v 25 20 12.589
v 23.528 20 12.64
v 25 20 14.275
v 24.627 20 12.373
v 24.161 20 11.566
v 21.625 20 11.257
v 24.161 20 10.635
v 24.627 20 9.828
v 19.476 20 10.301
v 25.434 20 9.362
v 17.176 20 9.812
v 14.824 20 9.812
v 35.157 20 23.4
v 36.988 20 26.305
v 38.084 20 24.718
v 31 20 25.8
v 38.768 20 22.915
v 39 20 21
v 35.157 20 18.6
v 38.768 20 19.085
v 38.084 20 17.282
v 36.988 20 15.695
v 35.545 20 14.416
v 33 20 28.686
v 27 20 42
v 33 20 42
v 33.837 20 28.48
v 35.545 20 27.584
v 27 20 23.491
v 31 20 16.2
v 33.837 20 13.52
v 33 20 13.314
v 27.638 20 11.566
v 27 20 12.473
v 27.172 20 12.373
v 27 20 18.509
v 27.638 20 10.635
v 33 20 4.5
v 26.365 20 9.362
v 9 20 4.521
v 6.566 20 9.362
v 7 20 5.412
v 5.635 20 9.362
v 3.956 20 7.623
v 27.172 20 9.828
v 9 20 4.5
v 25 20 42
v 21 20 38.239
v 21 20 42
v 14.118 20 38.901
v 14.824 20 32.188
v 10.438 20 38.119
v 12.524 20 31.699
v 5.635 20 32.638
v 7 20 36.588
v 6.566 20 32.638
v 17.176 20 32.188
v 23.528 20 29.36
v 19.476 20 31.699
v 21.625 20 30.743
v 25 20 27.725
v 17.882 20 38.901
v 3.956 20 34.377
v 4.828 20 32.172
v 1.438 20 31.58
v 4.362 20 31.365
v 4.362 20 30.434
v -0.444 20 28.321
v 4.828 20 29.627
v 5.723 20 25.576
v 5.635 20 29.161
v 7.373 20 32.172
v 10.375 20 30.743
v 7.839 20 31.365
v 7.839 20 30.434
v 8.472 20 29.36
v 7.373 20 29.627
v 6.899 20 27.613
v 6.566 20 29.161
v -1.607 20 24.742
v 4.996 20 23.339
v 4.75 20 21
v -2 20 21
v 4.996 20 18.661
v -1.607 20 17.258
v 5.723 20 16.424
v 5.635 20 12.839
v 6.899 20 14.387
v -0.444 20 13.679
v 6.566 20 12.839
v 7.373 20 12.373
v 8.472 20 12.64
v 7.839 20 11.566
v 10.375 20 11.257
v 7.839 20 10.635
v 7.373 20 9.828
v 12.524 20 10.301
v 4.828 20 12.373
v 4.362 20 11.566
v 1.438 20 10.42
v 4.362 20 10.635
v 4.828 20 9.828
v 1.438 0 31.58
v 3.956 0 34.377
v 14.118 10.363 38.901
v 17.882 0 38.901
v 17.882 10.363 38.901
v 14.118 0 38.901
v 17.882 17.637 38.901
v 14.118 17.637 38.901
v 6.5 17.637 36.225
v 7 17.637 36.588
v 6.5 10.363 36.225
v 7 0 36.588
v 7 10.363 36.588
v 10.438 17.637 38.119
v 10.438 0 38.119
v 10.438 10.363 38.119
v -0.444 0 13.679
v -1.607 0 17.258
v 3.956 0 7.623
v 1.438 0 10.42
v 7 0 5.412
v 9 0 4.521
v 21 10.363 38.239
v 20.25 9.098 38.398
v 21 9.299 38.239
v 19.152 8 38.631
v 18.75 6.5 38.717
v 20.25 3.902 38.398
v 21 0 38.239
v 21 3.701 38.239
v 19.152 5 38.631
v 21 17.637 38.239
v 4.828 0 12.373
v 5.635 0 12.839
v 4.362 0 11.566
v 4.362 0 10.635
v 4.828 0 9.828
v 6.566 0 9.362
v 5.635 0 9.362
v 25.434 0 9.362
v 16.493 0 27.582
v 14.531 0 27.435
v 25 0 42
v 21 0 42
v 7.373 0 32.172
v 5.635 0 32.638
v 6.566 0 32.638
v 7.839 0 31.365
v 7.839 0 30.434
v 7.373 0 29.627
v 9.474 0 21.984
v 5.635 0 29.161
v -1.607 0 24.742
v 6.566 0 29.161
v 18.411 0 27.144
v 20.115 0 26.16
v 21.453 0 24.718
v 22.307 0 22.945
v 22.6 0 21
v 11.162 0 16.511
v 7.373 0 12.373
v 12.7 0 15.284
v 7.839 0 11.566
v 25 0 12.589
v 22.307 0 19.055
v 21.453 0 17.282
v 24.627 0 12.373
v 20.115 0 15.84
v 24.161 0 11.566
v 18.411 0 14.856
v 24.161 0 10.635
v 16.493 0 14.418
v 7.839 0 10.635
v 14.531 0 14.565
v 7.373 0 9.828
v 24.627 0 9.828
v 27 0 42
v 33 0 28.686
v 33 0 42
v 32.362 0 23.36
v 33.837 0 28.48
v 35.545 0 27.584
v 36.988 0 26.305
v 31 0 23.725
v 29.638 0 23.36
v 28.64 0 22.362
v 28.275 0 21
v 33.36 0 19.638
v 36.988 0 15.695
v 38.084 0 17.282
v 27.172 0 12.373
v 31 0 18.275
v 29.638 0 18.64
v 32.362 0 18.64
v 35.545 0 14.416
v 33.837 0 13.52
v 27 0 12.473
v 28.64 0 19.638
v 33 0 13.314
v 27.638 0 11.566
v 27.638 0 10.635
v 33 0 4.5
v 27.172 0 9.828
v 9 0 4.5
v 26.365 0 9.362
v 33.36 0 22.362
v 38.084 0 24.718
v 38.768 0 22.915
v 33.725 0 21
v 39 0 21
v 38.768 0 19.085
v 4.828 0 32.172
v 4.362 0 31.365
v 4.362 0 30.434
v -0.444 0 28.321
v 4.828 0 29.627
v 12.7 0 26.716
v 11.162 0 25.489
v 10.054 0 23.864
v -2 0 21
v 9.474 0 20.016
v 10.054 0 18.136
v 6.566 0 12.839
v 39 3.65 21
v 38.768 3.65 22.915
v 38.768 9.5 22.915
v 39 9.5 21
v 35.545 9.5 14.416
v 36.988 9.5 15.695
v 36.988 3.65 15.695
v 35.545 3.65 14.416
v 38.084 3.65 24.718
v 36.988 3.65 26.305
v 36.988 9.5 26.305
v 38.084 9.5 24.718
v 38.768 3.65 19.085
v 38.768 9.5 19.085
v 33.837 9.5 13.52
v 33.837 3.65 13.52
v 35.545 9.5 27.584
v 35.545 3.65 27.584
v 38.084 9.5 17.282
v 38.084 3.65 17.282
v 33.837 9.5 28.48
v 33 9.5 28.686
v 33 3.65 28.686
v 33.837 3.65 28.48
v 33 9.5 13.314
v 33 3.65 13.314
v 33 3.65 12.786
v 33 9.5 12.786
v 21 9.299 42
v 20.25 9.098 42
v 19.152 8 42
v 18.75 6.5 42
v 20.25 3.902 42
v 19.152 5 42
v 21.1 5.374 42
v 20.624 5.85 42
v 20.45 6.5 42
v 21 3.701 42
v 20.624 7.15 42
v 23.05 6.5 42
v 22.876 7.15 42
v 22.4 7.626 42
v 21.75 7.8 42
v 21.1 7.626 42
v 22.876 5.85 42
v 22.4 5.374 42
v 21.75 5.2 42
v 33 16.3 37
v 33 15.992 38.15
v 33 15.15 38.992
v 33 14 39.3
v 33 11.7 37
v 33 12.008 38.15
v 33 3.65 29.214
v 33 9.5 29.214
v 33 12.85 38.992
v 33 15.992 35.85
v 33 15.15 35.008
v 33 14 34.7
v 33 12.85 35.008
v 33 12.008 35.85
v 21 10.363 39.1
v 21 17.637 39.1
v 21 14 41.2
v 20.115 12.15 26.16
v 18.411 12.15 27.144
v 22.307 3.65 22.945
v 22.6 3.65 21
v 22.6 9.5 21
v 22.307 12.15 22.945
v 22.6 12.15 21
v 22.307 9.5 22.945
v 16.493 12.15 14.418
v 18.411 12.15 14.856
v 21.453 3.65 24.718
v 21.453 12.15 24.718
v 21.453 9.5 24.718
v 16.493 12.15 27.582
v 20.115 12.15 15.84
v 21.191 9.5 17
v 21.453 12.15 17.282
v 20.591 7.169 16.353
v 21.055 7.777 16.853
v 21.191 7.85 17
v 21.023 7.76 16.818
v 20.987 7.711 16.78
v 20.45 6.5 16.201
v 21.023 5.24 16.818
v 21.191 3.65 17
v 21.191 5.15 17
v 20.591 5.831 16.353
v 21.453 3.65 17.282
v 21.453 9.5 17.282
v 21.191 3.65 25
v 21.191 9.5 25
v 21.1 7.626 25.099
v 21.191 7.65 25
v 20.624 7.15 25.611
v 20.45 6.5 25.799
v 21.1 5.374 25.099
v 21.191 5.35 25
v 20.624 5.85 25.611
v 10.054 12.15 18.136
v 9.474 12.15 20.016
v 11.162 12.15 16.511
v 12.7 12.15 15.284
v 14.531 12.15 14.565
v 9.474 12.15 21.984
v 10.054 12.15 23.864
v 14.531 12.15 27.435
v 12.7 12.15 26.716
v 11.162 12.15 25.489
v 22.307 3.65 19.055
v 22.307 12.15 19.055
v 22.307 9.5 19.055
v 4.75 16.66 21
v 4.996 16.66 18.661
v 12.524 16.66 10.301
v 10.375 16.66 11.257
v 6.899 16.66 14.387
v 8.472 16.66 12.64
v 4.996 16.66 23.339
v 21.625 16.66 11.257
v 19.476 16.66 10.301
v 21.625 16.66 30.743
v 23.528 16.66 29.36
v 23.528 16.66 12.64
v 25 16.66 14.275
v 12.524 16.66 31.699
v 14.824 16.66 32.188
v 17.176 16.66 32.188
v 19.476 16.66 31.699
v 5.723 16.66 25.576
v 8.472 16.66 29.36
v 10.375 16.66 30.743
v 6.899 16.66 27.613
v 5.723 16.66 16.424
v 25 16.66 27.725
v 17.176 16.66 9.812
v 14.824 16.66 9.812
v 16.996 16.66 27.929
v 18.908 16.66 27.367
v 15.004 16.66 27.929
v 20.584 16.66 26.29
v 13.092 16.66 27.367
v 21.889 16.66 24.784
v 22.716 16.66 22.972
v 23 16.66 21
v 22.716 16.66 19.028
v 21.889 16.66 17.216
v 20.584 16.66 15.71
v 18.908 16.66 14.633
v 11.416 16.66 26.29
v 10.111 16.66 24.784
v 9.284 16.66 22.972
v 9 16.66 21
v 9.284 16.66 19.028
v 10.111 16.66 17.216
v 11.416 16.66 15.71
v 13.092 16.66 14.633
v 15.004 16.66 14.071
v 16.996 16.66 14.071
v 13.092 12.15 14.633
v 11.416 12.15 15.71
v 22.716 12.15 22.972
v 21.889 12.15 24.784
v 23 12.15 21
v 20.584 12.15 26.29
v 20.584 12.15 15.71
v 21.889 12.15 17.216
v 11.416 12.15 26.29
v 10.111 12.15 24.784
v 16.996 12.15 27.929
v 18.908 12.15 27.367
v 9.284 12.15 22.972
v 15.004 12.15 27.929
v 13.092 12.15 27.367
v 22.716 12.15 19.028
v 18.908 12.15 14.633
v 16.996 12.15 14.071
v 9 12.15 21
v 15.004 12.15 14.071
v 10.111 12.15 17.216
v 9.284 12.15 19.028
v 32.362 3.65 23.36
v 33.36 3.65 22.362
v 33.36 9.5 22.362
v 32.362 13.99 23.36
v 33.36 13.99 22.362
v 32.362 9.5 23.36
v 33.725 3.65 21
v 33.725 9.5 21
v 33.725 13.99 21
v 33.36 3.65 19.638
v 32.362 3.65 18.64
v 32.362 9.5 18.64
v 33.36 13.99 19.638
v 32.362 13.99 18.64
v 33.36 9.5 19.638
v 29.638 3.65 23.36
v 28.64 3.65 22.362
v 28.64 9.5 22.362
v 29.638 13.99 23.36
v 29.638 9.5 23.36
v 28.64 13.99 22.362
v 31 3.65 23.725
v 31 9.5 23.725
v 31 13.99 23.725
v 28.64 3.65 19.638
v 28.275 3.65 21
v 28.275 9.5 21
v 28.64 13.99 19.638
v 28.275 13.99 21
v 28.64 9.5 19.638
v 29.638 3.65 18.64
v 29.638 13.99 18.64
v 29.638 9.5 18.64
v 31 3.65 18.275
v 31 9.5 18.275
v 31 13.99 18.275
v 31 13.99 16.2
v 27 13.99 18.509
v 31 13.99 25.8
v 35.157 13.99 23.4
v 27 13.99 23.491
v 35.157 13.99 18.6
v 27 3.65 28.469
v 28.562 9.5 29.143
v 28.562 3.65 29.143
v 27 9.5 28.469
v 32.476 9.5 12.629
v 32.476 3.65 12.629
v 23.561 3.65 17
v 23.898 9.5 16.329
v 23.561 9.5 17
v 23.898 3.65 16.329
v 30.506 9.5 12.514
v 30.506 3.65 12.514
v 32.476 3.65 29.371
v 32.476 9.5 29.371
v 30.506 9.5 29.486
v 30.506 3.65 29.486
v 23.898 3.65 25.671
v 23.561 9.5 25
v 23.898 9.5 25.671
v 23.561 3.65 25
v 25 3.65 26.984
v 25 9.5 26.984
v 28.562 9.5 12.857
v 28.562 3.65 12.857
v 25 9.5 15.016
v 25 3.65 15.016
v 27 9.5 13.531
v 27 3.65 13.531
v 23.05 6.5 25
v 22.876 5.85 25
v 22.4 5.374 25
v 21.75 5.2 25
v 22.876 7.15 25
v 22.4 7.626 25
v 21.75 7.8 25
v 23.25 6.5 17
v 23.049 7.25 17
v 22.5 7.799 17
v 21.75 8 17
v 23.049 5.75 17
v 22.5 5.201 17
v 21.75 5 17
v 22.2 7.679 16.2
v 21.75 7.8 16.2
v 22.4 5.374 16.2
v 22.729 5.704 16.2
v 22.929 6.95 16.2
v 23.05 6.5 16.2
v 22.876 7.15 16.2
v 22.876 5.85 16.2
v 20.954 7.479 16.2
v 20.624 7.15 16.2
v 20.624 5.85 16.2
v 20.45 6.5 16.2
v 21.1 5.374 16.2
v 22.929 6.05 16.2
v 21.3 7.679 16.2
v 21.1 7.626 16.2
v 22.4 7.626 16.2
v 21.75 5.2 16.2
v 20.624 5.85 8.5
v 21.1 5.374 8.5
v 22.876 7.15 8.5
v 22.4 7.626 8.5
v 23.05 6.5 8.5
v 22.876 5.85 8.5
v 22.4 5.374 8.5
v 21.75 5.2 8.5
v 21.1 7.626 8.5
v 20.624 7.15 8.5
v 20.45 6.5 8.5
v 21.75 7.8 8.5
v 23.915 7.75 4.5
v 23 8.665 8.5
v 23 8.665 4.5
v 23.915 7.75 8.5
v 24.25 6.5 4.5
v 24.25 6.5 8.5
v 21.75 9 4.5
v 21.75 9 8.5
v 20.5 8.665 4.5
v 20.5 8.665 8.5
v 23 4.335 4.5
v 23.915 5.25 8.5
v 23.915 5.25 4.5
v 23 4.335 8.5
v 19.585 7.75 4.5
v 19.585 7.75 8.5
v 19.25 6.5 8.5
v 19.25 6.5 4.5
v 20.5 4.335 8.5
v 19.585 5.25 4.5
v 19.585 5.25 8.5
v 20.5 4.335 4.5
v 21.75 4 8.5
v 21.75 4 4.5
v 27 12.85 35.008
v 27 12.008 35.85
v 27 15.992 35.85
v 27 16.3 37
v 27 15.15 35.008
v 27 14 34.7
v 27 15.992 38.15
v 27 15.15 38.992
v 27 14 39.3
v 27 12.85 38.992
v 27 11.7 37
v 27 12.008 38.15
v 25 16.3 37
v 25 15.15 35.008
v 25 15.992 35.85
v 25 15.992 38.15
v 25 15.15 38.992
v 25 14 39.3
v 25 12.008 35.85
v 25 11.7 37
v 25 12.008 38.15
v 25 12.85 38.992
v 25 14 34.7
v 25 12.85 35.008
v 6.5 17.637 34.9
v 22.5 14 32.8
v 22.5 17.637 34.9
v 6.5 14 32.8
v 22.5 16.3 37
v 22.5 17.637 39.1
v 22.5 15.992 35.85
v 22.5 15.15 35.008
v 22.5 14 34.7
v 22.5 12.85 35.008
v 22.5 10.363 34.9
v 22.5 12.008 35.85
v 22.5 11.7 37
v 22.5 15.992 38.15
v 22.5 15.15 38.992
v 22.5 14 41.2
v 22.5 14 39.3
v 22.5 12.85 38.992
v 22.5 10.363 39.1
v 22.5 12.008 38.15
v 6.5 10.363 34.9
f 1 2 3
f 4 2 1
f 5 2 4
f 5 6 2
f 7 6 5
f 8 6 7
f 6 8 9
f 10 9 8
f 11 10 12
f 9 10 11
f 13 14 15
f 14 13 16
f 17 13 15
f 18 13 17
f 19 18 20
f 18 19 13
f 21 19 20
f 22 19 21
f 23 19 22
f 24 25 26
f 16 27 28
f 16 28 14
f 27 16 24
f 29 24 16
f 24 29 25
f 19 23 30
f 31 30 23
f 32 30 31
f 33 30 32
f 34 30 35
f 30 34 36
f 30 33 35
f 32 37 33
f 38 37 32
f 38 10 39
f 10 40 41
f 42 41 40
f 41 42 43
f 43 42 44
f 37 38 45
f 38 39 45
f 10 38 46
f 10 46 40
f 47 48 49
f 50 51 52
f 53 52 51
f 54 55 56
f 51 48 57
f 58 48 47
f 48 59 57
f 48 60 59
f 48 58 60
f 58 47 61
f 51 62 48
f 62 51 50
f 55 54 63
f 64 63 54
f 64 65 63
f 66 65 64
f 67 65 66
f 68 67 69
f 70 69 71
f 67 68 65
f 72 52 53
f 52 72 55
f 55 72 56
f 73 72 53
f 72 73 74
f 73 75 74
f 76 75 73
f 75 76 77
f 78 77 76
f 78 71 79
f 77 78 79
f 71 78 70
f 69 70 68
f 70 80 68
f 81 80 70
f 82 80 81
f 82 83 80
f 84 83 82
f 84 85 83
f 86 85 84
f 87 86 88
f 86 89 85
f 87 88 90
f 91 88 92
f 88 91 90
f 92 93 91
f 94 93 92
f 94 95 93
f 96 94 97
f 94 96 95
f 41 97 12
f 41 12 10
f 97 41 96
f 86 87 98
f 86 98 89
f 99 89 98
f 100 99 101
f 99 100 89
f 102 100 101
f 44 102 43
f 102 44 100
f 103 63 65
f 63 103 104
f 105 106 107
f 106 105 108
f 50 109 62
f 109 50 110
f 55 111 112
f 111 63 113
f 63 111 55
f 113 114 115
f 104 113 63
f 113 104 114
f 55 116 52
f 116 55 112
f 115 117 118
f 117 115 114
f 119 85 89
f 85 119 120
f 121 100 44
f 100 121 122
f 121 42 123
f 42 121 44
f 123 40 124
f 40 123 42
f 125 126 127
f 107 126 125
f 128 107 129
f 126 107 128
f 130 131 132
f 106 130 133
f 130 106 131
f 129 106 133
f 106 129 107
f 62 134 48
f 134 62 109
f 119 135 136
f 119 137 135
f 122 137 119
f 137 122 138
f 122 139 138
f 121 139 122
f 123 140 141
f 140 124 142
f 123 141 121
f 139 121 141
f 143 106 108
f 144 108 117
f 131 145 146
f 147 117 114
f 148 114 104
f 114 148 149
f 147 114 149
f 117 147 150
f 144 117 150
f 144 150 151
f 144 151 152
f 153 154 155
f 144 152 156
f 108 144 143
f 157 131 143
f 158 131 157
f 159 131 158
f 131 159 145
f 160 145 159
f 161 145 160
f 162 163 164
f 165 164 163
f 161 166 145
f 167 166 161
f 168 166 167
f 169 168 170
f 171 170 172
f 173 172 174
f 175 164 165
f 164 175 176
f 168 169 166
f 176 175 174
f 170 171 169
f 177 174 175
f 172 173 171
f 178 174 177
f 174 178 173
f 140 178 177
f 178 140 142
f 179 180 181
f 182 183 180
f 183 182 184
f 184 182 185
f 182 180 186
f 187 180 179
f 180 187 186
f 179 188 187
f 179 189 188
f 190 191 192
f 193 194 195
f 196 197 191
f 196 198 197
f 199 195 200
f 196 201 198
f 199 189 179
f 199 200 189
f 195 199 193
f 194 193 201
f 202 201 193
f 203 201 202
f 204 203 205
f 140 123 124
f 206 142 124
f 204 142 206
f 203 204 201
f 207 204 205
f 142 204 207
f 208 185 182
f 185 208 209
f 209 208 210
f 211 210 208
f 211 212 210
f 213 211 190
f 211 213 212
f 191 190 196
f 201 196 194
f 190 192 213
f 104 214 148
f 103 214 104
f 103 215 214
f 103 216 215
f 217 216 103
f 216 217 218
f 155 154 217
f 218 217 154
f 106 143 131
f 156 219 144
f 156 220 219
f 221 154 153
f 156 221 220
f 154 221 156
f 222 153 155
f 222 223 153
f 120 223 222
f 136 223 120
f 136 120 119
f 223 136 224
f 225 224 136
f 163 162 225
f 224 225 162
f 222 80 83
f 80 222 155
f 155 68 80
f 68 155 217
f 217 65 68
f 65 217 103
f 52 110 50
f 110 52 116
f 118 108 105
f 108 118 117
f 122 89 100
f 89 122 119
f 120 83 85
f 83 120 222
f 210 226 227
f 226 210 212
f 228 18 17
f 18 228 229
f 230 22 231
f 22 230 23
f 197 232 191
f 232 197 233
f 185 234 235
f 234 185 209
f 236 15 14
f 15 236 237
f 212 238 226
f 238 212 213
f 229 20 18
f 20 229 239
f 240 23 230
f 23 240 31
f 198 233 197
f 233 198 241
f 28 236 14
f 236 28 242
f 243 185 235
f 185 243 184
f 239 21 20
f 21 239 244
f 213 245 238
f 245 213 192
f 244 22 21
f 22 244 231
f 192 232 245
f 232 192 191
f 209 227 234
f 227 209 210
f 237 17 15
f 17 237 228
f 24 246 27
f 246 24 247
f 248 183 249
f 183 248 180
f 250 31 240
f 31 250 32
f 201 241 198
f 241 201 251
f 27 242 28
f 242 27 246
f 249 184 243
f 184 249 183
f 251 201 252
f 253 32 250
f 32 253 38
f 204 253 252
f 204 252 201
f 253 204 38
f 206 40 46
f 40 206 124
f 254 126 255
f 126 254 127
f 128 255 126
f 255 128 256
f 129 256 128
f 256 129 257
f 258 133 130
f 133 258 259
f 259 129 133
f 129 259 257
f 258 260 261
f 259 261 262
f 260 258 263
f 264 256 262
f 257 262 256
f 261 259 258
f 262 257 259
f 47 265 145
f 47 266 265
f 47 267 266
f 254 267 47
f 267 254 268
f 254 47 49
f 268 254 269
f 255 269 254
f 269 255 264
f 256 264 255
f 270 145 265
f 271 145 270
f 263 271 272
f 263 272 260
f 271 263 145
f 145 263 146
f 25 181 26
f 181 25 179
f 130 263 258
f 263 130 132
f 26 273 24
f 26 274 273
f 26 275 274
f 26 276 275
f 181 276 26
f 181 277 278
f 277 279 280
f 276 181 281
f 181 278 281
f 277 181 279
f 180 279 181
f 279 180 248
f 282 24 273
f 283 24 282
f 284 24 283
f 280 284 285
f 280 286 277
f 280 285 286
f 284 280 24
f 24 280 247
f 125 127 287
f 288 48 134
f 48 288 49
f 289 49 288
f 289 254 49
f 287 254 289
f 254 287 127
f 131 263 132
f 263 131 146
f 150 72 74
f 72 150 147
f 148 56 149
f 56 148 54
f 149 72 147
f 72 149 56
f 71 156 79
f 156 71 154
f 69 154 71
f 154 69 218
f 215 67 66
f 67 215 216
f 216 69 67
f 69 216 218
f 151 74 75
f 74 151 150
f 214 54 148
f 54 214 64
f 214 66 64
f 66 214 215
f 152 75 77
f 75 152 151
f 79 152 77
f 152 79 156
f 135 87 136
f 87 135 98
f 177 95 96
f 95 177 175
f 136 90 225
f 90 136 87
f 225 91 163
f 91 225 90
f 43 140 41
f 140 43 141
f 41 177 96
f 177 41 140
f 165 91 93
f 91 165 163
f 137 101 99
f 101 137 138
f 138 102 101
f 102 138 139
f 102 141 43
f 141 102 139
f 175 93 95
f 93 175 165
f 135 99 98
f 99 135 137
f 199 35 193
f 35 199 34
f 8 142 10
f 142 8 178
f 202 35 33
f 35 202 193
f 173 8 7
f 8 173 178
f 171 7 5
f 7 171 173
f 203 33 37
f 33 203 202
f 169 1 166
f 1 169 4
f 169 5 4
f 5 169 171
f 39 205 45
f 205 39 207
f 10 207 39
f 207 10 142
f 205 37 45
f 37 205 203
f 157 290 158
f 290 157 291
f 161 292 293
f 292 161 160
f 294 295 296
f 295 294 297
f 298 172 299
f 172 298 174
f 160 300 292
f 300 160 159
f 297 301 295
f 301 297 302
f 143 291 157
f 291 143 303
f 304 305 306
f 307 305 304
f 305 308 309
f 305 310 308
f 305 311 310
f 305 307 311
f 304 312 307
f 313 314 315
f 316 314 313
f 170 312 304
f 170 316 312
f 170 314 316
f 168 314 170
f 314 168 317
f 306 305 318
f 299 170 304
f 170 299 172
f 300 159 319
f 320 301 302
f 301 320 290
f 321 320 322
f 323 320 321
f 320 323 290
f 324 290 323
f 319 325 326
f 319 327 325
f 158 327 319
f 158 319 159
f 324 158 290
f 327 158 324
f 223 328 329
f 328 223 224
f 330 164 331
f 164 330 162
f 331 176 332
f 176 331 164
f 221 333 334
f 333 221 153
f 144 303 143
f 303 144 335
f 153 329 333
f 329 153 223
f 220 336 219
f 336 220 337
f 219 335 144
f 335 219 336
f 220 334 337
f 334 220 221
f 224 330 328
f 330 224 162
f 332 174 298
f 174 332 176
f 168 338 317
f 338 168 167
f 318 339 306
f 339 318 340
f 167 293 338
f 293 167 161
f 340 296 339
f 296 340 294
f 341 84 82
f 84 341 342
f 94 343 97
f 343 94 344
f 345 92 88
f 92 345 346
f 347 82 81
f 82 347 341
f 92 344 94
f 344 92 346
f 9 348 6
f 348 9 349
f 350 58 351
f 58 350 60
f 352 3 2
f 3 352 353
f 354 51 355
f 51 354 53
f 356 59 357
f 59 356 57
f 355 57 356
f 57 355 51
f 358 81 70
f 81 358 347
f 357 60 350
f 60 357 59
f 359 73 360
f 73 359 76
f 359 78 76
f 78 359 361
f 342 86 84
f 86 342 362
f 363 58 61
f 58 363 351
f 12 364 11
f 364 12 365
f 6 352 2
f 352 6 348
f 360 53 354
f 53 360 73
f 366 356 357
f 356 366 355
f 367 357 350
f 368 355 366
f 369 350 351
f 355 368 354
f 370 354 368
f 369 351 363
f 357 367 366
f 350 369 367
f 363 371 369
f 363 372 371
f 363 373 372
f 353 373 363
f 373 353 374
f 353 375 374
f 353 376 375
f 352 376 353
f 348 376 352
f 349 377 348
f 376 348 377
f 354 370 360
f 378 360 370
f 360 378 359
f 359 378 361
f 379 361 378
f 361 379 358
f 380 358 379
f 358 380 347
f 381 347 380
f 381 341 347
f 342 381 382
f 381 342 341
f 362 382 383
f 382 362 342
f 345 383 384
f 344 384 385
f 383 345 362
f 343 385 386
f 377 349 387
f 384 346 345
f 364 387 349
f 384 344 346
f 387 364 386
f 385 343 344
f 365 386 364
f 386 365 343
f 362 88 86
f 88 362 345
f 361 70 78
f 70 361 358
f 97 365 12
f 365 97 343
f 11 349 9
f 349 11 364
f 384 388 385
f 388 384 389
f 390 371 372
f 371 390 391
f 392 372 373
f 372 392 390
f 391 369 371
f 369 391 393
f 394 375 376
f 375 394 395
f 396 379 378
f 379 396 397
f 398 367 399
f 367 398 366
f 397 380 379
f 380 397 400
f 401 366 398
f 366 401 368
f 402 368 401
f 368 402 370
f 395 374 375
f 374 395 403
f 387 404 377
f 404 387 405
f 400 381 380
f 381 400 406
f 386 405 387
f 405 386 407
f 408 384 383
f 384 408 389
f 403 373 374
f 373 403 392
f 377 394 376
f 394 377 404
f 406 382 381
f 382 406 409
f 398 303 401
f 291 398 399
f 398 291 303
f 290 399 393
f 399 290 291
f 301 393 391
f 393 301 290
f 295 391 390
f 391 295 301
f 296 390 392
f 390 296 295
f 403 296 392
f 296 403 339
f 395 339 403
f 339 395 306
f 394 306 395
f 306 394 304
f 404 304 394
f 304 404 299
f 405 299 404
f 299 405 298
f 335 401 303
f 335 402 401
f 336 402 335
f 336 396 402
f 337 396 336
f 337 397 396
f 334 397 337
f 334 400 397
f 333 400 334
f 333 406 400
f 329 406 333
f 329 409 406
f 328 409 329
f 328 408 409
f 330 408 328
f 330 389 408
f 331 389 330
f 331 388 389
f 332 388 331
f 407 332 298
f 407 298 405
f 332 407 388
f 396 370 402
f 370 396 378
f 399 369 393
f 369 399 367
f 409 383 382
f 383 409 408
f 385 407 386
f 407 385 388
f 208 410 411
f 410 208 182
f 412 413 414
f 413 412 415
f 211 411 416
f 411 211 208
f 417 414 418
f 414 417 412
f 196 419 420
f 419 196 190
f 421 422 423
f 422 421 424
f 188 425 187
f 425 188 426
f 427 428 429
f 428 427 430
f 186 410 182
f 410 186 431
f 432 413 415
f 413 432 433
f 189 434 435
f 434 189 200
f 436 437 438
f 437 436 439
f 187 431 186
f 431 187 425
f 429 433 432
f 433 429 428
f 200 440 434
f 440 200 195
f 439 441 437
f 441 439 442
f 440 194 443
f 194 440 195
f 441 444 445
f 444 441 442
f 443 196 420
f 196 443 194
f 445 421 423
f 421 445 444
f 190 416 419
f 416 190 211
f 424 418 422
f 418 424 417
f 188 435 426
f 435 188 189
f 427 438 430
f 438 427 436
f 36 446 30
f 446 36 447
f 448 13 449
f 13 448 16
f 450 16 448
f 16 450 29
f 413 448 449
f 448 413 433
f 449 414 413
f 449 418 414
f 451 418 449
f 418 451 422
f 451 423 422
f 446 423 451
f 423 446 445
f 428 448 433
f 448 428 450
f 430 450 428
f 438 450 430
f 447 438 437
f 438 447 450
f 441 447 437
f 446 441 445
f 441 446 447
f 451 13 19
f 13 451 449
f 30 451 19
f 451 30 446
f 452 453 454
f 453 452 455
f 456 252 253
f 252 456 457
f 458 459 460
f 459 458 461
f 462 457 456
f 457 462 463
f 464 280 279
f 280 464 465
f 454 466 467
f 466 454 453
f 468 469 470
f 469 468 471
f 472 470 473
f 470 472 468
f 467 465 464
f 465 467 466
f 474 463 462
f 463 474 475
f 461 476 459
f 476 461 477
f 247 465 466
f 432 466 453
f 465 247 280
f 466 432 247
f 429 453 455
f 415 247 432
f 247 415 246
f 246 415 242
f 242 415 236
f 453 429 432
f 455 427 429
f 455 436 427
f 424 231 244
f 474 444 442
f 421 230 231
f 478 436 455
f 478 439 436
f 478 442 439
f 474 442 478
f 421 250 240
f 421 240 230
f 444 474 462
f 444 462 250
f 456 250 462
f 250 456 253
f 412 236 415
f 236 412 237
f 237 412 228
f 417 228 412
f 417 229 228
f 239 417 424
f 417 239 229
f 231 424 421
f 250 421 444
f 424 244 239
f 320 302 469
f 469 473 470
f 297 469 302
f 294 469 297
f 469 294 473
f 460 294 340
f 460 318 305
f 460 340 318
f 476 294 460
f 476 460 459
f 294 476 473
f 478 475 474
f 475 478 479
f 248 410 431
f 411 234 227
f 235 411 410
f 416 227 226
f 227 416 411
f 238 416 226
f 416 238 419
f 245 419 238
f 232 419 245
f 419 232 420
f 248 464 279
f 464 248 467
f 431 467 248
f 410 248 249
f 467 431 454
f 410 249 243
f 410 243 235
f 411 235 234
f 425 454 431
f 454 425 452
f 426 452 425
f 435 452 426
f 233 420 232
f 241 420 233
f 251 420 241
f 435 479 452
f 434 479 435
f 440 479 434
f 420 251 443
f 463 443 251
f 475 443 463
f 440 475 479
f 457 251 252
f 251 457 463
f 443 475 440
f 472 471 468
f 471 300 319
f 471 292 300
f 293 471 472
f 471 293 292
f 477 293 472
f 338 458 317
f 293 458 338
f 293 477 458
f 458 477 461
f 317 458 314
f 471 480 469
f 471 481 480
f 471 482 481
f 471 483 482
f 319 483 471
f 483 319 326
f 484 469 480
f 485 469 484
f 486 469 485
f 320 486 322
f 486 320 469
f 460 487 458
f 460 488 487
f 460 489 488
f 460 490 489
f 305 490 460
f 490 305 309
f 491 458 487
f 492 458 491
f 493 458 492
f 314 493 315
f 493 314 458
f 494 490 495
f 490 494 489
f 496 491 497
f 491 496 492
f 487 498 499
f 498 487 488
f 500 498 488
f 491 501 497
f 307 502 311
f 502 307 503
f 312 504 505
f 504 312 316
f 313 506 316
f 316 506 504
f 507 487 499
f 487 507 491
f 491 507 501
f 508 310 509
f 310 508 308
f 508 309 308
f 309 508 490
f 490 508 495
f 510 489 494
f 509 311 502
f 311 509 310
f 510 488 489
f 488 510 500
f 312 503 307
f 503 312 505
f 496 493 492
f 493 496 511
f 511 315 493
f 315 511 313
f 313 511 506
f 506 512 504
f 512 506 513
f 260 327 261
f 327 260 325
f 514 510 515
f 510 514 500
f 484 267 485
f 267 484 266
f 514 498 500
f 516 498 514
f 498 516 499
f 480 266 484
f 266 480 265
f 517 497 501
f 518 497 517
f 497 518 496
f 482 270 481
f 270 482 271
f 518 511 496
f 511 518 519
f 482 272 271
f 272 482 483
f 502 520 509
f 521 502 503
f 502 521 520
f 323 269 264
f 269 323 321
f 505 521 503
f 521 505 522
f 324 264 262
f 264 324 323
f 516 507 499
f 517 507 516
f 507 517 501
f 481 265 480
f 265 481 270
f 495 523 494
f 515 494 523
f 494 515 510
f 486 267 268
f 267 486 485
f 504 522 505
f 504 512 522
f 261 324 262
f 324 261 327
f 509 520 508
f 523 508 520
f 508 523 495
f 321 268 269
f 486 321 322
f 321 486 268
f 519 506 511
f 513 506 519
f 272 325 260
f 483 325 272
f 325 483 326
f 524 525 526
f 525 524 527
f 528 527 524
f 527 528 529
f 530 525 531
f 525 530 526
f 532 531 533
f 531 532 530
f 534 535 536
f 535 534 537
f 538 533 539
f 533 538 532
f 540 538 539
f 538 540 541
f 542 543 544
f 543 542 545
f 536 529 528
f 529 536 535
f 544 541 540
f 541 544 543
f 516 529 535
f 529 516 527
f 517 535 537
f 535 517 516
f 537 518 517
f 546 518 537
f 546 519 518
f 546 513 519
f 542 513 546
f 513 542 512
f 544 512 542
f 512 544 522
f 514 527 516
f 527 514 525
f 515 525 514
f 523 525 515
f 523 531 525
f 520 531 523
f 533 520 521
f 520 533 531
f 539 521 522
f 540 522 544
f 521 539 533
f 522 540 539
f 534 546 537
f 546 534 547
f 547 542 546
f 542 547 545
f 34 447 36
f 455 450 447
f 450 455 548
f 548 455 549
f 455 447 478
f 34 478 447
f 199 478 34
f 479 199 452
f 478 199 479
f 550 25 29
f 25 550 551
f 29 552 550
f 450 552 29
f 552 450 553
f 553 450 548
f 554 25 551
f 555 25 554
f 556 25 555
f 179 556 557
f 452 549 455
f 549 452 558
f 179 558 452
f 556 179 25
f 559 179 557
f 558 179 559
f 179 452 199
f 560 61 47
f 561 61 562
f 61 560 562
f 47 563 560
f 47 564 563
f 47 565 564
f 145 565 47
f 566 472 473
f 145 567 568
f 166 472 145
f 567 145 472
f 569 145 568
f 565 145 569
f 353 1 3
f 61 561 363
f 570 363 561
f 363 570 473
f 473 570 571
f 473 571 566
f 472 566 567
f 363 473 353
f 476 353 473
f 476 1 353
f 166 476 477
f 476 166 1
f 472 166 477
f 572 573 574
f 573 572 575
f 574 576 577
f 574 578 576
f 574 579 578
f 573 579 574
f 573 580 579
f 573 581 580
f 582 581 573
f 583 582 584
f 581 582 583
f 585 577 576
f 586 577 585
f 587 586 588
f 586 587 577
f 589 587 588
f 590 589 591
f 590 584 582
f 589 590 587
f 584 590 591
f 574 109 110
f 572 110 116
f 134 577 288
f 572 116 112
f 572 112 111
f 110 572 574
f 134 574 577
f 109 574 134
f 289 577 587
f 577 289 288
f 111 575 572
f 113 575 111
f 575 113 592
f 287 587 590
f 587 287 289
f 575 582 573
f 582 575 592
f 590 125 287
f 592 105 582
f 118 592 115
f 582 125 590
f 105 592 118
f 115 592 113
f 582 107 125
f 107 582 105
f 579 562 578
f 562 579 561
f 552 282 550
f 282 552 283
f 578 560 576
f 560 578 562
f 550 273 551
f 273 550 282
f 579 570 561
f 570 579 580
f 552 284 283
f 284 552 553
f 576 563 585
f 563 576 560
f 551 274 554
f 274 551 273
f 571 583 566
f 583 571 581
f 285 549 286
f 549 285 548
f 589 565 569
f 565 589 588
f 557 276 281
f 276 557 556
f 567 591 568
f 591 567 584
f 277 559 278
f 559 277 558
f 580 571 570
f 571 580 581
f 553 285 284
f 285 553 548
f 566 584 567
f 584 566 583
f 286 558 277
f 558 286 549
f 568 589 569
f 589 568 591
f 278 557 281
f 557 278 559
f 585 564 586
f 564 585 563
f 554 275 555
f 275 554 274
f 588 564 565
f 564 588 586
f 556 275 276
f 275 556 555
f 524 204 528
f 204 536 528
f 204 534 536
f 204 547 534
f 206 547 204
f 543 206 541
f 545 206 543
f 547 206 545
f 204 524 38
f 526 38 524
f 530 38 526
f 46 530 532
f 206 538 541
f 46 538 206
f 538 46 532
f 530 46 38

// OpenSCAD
first_layer = 0.3;

difference() {
	
	union() {
		//main cylinder
		translate([16,20,21]) rotate([90,0,0]) cylinder(h=20, r=18);//cube([44, 20, 42]);
		
		//bearing mount
		translate([31,20,21]) rotate([90,0,0]) cylinder (h=20, r=8);
		
		//V3 Mount
		translate([9,0,-7]) cube([24, 20, 22]);
		translate([21,first_layer/2,-11]) rotate([90,0,0]) cube([24, 22, first_layer], center=true);
		//translate([27,first_layer/2,45]) rotate([90,0,0]) cube([12, 22, first_layer], center=true);
		
		//filament support
		translate([21.75,6.5,34]) rotate([0,0,0]) cylinder (h=8, r=3, $fn=12);
		
		//groovemount supports
//		translate([33,6.5,-7]) rotate([0,0,0]) cylinder (h=16, r=5, $fn=12);
//		translate([9,6.5,-7]) rotate([0,0,0]) cylinder (h=16, r=5, $fn=12);
		
		//clamp
		translate([21,0,28]) cube([12, 20, 14]);
	}
	
	//pulley opening
	translate([16,21,21]) rotate([90,0,0]){
		cylinder (h=22, r=6.6);
		
		rotate([0,0,45]) {
		//translate([14,0,0]) cylinder(h=22, r=1.6, $fn=12);
		translate([0,14,0]) cylinder(h=22, r=1.8, $fn=12);
		translate([-14,0,0]) cylinder(h=22, r=1.8, $fn=12);
		translate([0,-14,0]) cylinder(h=22, r=1.8, $fn=12);
		}
	}
	
	//gearhead indentation
	translate([16,20.01,21]) rotate([90,0,0]) cylinder (h=3.35, r=11.25);

	//pulley hub indentation
	translate([16,20-2,21]) rotate([90,0,0]) cylinder (h=5.85, r=7);
	
	//bearing screws
	translate([31,21,21]) rotate([90,0,0]) cylinder (h=22, r=2.725, $fn=12); //precision m5

	//translate([31,21,21]) rotate([90,0,0]) cylinder (h=22, r=2.6, $fn=12); //regular M5 screw
	//translate([31,22,21]) rotate([90,30,0]) cylinder (h=8.01, r=8.1/2, $fn=6); //M4
	translate([31,22,21]) rotate([90,30,0]) cylinder (h=8.01, r=4.8, $fn=6); //M5
	
	//bearing
	translate([31,9.5,21]) rotate([90,0,0]) cylinder (h=5.85, r=8.5);
	//translate([25,9.5-5.25,21-8.25-2]) cube([20, 5.85, 18.5]);
	
	//opening between bearing and pulley
	translate([20,9.5-5.85,21-8.25+3.25+1]) cube([10, 5.85, 8]);

	//filament path chamfer
	translate([21.75,6.5,15]) rotate([0,0,0]) cylinder (h=2, r1=1, r2=1.5, $fn=12);		

	translate([31,9.5,21]) rotate([90,0,0]) cylinder (h=5.85, r=8.5);

	
	//filament path
	translate([21.75,6.5,-10]) rotate([0,0,0]) cylinder (h=60, r=1.3, $fn=12); 
	translate([21.75,6.5,-51.5]) rotate([0,0,0]) cylinder (h=60, r=2.5, $fn=12); 
	
	//V3 Mount
//	translate([21.75,6.5,-2]) rotate([0,0,0]) cylinder (h=5, r=8.25);
	translate([21.75,6.5,-7]) rotate([0,0,0]) cylinder (h=8, r=4.5);
//	translate([21.75-8,6.5-8,-2]) cube([16, 8, 5]);
//	translate([21.75-6,6.5-7,-7]) cube([12, 7, 5]);
	translate([21.75,6.5,3.5]) rotate([90,0,0]) cylinder (h=10, r=1,  $fn=12);
	
	//groovemount supports
//	translate([33,6.5,-8]) rotate([0,0,0]) cylinder (h=20, r=1.6, $fn=12);
//	translate([33,6.5,7]) rotate([0,0,0]) cylinder (h=3, r=3.5, $fn=6);

//	translate([9,6.5,-8]) rotate([0,0,0]) cylinder (h=20, r=1.6, $fn=12);
//	translate([9,6.5,7]) rotate([0,0,0]) cylinder (h=3, r=3.5, $fn=6);
//	translate([3,3,7]) cube([8, 7, 3]);
	
	//clamp slit
	translate([25,-1,10]) cube([2, 22, 35]);
	//clamp nut
	translate([6.5,14,37]) rotate([0,90,0]) cylinder (h=16, r=4.2, $fn=6);
	//clamp screw hole
	translate([15,14,37]) rotate([0,90,0]) cylinder (h=20, r=2.3, $fn=12);
	
	translate([9,-2,-25.5])cube(30,20,10);
    translate([9,-2,43.5])cube(30,20,10);
}
